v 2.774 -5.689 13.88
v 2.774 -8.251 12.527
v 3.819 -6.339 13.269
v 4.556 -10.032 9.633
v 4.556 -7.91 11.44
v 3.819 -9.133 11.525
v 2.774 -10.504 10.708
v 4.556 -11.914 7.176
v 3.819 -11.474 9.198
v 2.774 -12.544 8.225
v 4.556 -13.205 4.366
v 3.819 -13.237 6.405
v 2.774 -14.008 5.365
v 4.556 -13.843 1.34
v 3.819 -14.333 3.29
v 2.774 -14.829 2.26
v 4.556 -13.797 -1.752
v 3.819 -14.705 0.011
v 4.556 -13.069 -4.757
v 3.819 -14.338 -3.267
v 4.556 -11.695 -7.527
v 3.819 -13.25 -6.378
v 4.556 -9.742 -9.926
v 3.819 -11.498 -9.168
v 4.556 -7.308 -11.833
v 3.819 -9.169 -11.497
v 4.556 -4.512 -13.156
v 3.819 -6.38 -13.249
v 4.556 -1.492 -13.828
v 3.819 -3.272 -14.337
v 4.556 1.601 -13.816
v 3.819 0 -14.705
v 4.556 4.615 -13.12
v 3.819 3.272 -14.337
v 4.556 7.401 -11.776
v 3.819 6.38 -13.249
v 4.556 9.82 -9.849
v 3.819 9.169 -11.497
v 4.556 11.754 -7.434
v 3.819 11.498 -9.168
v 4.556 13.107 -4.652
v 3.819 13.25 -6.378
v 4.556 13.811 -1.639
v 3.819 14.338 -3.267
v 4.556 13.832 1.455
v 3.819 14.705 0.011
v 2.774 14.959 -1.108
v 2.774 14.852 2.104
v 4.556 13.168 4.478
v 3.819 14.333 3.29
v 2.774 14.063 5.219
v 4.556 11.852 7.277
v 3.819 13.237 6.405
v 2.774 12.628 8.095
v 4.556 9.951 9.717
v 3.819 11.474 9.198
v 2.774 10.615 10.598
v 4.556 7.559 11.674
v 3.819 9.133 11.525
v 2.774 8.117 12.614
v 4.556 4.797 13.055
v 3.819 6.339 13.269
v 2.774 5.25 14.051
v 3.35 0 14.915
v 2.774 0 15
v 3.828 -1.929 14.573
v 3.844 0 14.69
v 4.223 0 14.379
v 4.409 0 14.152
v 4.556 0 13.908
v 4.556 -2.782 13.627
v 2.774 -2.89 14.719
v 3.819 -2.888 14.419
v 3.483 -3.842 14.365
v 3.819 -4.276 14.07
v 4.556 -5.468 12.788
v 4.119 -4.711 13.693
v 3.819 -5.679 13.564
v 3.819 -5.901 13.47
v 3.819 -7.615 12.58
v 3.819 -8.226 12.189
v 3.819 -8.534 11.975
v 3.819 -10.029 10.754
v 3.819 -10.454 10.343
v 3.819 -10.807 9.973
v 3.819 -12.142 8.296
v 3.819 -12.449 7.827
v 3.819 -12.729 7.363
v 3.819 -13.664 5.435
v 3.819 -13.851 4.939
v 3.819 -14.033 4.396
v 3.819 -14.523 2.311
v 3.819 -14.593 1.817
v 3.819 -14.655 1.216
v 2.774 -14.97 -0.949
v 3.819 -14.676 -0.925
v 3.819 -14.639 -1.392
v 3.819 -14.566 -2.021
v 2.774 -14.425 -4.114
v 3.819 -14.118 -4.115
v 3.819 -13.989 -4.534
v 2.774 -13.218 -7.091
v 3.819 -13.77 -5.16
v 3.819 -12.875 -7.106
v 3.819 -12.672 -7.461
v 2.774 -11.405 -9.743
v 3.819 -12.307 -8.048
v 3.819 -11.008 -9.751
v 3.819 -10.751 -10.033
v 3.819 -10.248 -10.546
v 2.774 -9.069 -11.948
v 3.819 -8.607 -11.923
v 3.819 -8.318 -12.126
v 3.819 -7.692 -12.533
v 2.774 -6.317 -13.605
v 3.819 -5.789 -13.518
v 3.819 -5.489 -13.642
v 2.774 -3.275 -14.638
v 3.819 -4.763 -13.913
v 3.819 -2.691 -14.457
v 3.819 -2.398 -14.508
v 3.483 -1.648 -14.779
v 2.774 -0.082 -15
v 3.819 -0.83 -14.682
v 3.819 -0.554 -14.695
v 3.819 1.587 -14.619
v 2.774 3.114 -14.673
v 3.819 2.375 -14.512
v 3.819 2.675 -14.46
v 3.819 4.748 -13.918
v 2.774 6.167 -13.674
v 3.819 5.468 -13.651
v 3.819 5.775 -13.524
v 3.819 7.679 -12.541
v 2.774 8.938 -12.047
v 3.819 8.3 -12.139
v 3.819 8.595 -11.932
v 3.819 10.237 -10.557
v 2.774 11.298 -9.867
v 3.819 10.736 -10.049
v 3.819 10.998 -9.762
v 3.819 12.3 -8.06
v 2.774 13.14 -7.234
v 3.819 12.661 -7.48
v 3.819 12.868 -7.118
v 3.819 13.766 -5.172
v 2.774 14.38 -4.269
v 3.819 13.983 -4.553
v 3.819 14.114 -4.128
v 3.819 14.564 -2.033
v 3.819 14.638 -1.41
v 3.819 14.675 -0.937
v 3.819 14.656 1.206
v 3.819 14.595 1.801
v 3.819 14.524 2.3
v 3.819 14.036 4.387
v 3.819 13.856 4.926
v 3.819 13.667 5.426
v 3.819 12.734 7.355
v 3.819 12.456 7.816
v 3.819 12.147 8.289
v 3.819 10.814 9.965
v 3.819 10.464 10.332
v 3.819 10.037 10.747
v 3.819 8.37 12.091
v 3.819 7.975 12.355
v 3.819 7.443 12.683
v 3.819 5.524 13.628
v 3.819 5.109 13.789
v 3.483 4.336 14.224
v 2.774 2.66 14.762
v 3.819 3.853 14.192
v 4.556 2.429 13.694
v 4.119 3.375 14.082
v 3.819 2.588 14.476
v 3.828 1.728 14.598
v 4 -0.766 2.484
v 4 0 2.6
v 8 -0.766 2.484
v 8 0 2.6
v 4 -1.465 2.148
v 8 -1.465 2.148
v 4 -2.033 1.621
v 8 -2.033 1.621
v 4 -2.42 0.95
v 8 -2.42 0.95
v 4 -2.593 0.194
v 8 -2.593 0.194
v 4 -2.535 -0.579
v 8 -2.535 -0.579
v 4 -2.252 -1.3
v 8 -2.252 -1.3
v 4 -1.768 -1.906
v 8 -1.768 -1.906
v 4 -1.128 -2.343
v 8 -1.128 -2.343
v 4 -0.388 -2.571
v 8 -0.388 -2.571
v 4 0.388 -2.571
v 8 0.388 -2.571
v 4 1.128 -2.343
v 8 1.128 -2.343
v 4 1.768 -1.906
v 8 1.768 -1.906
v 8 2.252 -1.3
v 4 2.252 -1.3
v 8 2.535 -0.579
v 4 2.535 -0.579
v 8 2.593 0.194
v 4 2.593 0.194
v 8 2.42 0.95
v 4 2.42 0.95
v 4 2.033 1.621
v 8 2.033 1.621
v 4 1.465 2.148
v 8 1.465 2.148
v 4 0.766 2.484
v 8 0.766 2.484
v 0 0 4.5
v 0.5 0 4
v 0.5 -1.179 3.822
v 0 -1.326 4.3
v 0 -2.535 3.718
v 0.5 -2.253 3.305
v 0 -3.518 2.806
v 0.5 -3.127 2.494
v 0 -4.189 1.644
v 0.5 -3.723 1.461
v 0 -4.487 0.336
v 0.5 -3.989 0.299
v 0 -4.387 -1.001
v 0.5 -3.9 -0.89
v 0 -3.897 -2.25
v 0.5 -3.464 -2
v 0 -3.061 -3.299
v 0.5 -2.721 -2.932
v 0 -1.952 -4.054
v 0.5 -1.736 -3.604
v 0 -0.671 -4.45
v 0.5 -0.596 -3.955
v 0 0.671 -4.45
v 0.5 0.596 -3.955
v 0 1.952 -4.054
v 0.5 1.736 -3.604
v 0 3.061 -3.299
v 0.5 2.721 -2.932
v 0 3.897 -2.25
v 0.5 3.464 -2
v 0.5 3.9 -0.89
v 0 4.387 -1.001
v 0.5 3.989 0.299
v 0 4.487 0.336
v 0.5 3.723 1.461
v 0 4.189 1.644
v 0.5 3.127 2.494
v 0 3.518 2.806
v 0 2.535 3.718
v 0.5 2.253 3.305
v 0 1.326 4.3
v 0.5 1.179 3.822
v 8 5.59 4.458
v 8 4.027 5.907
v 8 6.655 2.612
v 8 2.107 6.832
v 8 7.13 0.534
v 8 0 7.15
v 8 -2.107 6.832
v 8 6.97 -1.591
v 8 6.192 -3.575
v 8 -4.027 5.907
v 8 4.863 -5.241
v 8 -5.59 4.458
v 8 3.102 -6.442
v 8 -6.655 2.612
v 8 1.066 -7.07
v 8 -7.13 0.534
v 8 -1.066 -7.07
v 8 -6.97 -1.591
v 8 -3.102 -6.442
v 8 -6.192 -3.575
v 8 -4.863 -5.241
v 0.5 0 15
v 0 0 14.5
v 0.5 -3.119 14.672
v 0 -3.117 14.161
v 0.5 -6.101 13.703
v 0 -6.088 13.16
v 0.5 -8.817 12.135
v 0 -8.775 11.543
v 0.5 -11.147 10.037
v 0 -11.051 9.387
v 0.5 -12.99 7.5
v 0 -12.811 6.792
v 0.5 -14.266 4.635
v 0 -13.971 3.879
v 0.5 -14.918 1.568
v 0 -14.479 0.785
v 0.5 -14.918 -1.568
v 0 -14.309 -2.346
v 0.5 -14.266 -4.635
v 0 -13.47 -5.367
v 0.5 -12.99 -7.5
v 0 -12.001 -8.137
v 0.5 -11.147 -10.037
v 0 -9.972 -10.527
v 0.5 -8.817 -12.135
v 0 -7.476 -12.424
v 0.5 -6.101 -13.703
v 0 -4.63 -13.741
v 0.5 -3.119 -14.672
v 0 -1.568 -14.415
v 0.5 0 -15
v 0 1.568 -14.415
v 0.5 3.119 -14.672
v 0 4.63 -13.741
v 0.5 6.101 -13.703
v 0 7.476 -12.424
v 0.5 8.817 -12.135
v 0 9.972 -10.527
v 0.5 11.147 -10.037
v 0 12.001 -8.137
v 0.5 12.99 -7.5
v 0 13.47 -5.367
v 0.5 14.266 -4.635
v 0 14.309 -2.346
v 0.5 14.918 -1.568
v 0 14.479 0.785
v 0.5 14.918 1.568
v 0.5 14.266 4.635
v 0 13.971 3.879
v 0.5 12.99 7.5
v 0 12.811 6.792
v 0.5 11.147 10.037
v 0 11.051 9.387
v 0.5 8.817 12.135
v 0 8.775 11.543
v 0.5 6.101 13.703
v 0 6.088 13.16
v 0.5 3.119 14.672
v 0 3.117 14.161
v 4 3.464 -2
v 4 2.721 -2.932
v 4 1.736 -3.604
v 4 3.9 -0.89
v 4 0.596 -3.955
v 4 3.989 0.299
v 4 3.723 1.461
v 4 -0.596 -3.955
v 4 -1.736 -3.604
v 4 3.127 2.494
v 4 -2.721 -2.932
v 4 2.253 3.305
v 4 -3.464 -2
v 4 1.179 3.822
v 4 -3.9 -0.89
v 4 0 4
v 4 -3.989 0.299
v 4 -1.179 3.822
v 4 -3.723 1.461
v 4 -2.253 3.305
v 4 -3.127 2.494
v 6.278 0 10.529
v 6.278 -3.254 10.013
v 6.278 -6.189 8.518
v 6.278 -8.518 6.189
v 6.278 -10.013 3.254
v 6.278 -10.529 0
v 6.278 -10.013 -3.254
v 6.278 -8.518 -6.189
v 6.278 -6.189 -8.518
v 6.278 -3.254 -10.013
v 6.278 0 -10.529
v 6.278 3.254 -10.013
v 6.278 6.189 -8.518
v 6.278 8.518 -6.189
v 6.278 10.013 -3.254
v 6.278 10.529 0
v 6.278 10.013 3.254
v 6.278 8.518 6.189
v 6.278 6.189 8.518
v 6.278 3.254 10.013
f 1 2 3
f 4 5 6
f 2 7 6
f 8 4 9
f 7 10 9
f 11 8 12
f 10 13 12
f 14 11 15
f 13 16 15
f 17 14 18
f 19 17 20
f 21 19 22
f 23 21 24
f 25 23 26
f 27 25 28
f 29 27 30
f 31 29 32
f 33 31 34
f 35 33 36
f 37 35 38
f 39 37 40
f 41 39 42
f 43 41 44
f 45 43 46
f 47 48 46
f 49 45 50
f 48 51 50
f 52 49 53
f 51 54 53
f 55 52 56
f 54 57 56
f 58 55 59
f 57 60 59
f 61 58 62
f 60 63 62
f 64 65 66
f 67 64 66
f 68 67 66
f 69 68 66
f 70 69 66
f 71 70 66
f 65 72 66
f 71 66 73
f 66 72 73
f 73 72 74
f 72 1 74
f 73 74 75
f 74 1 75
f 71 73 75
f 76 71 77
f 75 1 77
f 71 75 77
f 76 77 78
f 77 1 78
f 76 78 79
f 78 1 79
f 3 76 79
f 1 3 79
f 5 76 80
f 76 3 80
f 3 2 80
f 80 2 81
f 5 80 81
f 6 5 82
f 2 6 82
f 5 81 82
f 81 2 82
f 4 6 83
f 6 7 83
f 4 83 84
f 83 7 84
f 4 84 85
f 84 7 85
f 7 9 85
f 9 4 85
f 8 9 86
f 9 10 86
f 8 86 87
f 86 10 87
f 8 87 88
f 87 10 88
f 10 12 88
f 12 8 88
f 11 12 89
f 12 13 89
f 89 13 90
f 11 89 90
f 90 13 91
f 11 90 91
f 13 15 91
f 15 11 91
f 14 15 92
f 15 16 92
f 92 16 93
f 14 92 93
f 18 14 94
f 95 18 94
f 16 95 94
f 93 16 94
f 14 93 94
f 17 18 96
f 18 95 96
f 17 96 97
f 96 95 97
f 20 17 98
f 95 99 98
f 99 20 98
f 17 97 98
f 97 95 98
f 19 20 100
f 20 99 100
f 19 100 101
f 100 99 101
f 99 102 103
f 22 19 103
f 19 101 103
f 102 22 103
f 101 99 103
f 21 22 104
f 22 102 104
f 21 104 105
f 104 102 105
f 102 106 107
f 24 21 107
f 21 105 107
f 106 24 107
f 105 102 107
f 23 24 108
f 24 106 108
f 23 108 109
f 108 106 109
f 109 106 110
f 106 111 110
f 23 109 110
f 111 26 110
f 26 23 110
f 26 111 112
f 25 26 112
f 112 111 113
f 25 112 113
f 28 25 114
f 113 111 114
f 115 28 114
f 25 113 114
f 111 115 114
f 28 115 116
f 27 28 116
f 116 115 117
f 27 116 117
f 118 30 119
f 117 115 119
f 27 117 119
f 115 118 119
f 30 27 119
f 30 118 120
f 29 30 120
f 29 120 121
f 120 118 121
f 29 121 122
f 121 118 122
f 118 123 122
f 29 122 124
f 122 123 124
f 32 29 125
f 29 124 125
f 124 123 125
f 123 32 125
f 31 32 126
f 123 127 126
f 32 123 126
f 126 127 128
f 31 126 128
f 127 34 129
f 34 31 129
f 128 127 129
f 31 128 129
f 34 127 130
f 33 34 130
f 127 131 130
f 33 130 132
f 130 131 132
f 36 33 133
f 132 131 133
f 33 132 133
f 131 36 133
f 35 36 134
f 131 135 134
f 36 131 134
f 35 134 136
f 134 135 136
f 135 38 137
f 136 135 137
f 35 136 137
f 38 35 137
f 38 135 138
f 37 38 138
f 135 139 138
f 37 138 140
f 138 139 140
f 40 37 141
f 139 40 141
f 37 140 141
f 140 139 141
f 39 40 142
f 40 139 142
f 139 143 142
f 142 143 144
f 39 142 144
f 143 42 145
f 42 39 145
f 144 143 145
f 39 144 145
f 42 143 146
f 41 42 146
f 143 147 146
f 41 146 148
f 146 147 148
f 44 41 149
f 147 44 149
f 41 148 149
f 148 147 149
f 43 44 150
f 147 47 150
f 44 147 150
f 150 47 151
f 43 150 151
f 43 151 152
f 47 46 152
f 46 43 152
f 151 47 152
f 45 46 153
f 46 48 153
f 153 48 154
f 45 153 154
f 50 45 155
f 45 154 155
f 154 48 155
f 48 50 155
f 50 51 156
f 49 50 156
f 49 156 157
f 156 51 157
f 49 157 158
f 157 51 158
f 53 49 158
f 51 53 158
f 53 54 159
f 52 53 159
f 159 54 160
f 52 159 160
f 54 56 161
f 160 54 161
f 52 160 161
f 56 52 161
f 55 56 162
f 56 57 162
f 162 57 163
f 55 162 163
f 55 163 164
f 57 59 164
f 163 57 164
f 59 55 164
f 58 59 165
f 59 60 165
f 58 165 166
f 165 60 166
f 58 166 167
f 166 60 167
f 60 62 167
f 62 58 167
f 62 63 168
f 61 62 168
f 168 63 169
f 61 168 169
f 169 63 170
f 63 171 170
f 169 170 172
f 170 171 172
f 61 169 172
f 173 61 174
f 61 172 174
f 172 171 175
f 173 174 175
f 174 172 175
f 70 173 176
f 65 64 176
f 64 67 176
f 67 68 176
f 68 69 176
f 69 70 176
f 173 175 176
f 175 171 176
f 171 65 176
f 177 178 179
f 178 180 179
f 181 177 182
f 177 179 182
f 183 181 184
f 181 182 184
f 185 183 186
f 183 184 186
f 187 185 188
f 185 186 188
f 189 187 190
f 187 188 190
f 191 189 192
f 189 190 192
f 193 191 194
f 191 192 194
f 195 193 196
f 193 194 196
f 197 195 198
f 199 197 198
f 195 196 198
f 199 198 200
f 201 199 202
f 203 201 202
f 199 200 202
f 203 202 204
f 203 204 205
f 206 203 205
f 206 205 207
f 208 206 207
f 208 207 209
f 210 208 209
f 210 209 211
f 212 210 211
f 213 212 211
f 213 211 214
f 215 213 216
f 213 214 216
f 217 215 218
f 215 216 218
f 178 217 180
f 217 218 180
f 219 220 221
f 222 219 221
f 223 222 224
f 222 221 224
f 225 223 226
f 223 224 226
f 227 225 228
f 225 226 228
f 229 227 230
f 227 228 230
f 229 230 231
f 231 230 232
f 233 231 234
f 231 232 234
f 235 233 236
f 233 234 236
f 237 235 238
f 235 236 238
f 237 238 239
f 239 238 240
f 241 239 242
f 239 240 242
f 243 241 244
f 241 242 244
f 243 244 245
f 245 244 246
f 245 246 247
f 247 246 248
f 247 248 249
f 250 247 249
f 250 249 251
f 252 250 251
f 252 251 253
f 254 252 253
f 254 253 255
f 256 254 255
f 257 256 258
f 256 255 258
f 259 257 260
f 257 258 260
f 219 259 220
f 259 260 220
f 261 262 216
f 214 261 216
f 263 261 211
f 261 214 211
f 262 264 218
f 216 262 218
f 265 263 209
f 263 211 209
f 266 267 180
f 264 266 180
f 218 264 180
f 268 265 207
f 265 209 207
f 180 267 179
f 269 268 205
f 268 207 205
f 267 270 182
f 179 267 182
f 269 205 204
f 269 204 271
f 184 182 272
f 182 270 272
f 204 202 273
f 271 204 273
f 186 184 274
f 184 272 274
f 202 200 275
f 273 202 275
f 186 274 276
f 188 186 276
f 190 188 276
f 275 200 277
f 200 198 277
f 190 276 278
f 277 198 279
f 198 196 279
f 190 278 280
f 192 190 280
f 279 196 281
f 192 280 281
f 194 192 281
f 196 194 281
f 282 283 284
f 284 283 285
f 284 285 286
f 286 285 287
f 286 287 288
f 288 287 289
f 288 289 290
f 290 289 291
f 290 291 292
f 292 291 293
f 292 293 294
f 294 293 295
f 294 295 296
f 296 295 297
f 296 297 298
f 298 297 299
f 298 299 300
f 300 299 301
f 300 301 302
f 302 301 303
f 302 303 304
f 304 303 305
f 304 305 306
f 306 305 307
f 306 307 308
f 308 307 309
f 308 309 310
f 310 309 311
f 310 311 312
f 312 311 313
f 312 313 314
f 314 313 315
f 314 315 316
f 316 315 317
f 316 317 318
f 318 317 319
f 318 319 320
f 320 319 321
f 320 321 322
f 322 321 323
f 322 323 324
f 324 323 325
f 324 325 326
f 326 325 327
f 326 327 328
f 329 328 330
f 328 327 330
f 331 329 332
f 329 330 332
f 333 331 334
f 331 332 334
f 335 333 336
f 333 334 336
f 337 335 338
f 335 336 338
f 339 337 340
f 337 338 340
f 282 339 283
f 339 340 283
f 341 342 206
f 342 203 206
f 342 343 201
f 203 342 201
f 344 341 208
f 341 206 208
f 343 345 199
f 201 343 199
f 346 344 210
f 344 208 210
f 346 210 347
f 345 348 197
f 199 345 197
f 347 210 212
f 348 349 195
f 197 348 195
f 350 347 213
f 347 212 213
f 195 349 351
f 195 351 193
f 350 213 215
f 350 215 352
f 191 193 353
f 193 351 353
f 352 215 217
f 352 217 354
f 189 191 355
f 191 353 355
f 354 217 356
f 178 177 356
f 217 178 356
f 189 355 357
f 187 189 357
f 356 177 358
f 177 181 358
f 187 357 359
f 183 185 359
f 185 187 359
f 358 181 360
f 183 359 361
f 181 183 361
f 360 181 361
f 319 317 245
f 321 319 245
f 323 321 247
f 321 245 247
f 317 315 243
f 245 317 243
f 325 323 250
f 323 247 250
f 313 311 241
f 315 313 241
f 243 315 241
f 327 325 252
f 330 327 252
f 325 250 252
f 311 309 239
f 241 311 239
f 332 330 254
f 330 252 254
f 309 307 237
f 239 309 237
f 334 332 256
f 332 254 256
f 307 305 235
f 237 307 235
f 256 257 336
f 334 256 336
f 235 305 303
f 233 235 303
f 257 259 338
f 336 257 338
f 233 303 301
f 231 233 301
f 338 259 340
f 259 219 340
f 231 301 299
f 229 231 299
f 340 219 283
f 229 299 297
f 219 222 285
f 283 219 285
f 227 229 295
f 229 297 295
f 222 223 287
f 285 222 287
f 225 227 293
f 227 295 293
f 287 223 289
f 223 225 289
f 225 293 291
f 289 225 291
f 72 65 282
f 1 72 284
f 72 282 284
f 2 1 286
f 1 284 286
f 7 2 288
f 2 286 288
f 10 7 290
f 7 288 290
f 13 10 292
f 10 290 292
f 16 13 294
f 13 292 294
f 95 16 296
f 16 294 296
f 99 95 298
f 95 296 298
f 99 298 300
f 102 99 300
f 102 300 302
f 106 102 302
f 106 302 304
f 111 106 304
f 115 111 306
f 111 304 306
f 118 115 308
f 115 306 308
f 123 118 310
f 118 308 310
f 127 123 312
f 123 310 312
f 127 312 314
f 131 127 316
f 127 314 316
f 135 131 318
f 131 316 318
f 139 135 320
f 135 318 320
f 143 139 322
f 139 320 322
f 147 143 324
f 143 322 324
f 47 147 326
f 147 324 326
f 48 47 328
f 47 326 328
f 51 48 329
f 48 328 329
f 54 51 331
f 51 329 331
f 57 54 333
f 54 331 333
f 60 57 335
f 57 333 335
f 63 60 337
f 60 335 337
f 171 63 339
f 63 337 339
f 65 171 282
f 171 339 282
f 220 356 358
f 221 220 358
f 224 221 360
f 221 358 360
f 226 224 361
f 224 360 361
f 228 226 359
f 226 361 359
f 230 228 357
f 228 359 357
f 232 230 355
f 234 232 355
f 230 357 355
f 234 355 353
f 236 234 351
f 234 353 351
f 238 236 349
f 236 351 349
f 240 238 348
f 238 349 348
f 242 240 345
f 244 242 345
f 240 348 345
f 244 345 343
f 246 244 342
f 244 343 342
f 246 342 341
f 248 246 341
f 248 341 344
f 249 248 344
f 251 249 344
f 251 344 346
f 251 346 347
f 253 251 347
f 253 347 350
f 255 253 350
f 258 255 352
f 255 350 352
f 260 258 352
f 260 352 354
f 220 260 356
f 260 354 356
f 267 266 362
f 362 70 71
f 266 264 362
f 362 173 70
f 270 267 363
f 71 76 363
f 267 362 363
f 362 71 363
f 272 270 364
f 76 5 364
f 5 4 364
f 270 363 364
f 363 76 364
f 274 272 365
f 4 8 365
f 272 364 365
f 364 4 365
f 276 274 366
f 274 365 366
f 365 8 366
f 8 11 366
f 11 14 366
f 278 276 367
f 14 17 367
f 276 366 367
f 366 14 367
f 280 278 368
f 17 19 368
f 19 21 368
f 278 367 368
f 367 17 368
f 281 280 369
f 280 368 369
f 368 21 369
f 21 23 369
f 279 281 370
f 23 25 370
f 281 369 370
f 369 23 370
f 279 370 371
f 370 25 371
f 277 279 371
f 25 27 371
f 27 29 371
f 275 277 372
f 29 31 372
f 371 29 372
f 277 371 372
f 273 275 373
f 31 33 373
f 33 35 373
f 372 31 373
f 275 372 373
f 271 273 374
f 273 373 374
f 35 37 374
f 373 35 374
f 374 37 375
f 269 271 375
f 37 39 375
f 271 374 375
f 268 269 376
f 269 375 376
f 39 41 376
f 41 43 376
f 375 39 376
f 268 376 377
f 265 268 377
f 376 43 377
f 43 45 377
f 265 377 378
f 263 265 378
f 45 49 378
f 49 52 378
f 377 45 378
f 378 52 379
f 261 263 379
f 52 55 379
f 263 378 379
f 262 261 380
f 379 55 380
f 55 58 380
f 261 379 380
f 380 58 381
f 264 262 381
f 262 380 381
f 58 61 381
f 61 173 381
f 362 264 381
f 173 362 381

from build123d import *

# Parameters (mm, degrees)
F2_R    = 2
F3_SIZE = 0.5


with BuildPart() as f1:
    # F0 (on Front) → F1 (revolve)
    with BuildSketch(Plane.XZ):
        Polygon((4, 15), (0, 15), (0, 4), (4, 4), (4, 2.6), (8, 2.6), (8, 7.149558), align=None)
    revolve(axis=Axis((12.800059, 0, 0), (1, 0, 0)))

    # F2
    f2_edges = [f1.edges().sort_by_distance(p)[0] for p in [
        (4, 0, -15),
    ]]
    fillet(f2_edges, radius=F2_R)

    # F3
    f3_edges = [f1.edges().sort_by_distance(p)[0] for p in [
        (0, 0, -4),
        (0, 0, -15),
    ]]
    chamfer(f3_edges, length=F3_SIZE)


solid = f1.part
